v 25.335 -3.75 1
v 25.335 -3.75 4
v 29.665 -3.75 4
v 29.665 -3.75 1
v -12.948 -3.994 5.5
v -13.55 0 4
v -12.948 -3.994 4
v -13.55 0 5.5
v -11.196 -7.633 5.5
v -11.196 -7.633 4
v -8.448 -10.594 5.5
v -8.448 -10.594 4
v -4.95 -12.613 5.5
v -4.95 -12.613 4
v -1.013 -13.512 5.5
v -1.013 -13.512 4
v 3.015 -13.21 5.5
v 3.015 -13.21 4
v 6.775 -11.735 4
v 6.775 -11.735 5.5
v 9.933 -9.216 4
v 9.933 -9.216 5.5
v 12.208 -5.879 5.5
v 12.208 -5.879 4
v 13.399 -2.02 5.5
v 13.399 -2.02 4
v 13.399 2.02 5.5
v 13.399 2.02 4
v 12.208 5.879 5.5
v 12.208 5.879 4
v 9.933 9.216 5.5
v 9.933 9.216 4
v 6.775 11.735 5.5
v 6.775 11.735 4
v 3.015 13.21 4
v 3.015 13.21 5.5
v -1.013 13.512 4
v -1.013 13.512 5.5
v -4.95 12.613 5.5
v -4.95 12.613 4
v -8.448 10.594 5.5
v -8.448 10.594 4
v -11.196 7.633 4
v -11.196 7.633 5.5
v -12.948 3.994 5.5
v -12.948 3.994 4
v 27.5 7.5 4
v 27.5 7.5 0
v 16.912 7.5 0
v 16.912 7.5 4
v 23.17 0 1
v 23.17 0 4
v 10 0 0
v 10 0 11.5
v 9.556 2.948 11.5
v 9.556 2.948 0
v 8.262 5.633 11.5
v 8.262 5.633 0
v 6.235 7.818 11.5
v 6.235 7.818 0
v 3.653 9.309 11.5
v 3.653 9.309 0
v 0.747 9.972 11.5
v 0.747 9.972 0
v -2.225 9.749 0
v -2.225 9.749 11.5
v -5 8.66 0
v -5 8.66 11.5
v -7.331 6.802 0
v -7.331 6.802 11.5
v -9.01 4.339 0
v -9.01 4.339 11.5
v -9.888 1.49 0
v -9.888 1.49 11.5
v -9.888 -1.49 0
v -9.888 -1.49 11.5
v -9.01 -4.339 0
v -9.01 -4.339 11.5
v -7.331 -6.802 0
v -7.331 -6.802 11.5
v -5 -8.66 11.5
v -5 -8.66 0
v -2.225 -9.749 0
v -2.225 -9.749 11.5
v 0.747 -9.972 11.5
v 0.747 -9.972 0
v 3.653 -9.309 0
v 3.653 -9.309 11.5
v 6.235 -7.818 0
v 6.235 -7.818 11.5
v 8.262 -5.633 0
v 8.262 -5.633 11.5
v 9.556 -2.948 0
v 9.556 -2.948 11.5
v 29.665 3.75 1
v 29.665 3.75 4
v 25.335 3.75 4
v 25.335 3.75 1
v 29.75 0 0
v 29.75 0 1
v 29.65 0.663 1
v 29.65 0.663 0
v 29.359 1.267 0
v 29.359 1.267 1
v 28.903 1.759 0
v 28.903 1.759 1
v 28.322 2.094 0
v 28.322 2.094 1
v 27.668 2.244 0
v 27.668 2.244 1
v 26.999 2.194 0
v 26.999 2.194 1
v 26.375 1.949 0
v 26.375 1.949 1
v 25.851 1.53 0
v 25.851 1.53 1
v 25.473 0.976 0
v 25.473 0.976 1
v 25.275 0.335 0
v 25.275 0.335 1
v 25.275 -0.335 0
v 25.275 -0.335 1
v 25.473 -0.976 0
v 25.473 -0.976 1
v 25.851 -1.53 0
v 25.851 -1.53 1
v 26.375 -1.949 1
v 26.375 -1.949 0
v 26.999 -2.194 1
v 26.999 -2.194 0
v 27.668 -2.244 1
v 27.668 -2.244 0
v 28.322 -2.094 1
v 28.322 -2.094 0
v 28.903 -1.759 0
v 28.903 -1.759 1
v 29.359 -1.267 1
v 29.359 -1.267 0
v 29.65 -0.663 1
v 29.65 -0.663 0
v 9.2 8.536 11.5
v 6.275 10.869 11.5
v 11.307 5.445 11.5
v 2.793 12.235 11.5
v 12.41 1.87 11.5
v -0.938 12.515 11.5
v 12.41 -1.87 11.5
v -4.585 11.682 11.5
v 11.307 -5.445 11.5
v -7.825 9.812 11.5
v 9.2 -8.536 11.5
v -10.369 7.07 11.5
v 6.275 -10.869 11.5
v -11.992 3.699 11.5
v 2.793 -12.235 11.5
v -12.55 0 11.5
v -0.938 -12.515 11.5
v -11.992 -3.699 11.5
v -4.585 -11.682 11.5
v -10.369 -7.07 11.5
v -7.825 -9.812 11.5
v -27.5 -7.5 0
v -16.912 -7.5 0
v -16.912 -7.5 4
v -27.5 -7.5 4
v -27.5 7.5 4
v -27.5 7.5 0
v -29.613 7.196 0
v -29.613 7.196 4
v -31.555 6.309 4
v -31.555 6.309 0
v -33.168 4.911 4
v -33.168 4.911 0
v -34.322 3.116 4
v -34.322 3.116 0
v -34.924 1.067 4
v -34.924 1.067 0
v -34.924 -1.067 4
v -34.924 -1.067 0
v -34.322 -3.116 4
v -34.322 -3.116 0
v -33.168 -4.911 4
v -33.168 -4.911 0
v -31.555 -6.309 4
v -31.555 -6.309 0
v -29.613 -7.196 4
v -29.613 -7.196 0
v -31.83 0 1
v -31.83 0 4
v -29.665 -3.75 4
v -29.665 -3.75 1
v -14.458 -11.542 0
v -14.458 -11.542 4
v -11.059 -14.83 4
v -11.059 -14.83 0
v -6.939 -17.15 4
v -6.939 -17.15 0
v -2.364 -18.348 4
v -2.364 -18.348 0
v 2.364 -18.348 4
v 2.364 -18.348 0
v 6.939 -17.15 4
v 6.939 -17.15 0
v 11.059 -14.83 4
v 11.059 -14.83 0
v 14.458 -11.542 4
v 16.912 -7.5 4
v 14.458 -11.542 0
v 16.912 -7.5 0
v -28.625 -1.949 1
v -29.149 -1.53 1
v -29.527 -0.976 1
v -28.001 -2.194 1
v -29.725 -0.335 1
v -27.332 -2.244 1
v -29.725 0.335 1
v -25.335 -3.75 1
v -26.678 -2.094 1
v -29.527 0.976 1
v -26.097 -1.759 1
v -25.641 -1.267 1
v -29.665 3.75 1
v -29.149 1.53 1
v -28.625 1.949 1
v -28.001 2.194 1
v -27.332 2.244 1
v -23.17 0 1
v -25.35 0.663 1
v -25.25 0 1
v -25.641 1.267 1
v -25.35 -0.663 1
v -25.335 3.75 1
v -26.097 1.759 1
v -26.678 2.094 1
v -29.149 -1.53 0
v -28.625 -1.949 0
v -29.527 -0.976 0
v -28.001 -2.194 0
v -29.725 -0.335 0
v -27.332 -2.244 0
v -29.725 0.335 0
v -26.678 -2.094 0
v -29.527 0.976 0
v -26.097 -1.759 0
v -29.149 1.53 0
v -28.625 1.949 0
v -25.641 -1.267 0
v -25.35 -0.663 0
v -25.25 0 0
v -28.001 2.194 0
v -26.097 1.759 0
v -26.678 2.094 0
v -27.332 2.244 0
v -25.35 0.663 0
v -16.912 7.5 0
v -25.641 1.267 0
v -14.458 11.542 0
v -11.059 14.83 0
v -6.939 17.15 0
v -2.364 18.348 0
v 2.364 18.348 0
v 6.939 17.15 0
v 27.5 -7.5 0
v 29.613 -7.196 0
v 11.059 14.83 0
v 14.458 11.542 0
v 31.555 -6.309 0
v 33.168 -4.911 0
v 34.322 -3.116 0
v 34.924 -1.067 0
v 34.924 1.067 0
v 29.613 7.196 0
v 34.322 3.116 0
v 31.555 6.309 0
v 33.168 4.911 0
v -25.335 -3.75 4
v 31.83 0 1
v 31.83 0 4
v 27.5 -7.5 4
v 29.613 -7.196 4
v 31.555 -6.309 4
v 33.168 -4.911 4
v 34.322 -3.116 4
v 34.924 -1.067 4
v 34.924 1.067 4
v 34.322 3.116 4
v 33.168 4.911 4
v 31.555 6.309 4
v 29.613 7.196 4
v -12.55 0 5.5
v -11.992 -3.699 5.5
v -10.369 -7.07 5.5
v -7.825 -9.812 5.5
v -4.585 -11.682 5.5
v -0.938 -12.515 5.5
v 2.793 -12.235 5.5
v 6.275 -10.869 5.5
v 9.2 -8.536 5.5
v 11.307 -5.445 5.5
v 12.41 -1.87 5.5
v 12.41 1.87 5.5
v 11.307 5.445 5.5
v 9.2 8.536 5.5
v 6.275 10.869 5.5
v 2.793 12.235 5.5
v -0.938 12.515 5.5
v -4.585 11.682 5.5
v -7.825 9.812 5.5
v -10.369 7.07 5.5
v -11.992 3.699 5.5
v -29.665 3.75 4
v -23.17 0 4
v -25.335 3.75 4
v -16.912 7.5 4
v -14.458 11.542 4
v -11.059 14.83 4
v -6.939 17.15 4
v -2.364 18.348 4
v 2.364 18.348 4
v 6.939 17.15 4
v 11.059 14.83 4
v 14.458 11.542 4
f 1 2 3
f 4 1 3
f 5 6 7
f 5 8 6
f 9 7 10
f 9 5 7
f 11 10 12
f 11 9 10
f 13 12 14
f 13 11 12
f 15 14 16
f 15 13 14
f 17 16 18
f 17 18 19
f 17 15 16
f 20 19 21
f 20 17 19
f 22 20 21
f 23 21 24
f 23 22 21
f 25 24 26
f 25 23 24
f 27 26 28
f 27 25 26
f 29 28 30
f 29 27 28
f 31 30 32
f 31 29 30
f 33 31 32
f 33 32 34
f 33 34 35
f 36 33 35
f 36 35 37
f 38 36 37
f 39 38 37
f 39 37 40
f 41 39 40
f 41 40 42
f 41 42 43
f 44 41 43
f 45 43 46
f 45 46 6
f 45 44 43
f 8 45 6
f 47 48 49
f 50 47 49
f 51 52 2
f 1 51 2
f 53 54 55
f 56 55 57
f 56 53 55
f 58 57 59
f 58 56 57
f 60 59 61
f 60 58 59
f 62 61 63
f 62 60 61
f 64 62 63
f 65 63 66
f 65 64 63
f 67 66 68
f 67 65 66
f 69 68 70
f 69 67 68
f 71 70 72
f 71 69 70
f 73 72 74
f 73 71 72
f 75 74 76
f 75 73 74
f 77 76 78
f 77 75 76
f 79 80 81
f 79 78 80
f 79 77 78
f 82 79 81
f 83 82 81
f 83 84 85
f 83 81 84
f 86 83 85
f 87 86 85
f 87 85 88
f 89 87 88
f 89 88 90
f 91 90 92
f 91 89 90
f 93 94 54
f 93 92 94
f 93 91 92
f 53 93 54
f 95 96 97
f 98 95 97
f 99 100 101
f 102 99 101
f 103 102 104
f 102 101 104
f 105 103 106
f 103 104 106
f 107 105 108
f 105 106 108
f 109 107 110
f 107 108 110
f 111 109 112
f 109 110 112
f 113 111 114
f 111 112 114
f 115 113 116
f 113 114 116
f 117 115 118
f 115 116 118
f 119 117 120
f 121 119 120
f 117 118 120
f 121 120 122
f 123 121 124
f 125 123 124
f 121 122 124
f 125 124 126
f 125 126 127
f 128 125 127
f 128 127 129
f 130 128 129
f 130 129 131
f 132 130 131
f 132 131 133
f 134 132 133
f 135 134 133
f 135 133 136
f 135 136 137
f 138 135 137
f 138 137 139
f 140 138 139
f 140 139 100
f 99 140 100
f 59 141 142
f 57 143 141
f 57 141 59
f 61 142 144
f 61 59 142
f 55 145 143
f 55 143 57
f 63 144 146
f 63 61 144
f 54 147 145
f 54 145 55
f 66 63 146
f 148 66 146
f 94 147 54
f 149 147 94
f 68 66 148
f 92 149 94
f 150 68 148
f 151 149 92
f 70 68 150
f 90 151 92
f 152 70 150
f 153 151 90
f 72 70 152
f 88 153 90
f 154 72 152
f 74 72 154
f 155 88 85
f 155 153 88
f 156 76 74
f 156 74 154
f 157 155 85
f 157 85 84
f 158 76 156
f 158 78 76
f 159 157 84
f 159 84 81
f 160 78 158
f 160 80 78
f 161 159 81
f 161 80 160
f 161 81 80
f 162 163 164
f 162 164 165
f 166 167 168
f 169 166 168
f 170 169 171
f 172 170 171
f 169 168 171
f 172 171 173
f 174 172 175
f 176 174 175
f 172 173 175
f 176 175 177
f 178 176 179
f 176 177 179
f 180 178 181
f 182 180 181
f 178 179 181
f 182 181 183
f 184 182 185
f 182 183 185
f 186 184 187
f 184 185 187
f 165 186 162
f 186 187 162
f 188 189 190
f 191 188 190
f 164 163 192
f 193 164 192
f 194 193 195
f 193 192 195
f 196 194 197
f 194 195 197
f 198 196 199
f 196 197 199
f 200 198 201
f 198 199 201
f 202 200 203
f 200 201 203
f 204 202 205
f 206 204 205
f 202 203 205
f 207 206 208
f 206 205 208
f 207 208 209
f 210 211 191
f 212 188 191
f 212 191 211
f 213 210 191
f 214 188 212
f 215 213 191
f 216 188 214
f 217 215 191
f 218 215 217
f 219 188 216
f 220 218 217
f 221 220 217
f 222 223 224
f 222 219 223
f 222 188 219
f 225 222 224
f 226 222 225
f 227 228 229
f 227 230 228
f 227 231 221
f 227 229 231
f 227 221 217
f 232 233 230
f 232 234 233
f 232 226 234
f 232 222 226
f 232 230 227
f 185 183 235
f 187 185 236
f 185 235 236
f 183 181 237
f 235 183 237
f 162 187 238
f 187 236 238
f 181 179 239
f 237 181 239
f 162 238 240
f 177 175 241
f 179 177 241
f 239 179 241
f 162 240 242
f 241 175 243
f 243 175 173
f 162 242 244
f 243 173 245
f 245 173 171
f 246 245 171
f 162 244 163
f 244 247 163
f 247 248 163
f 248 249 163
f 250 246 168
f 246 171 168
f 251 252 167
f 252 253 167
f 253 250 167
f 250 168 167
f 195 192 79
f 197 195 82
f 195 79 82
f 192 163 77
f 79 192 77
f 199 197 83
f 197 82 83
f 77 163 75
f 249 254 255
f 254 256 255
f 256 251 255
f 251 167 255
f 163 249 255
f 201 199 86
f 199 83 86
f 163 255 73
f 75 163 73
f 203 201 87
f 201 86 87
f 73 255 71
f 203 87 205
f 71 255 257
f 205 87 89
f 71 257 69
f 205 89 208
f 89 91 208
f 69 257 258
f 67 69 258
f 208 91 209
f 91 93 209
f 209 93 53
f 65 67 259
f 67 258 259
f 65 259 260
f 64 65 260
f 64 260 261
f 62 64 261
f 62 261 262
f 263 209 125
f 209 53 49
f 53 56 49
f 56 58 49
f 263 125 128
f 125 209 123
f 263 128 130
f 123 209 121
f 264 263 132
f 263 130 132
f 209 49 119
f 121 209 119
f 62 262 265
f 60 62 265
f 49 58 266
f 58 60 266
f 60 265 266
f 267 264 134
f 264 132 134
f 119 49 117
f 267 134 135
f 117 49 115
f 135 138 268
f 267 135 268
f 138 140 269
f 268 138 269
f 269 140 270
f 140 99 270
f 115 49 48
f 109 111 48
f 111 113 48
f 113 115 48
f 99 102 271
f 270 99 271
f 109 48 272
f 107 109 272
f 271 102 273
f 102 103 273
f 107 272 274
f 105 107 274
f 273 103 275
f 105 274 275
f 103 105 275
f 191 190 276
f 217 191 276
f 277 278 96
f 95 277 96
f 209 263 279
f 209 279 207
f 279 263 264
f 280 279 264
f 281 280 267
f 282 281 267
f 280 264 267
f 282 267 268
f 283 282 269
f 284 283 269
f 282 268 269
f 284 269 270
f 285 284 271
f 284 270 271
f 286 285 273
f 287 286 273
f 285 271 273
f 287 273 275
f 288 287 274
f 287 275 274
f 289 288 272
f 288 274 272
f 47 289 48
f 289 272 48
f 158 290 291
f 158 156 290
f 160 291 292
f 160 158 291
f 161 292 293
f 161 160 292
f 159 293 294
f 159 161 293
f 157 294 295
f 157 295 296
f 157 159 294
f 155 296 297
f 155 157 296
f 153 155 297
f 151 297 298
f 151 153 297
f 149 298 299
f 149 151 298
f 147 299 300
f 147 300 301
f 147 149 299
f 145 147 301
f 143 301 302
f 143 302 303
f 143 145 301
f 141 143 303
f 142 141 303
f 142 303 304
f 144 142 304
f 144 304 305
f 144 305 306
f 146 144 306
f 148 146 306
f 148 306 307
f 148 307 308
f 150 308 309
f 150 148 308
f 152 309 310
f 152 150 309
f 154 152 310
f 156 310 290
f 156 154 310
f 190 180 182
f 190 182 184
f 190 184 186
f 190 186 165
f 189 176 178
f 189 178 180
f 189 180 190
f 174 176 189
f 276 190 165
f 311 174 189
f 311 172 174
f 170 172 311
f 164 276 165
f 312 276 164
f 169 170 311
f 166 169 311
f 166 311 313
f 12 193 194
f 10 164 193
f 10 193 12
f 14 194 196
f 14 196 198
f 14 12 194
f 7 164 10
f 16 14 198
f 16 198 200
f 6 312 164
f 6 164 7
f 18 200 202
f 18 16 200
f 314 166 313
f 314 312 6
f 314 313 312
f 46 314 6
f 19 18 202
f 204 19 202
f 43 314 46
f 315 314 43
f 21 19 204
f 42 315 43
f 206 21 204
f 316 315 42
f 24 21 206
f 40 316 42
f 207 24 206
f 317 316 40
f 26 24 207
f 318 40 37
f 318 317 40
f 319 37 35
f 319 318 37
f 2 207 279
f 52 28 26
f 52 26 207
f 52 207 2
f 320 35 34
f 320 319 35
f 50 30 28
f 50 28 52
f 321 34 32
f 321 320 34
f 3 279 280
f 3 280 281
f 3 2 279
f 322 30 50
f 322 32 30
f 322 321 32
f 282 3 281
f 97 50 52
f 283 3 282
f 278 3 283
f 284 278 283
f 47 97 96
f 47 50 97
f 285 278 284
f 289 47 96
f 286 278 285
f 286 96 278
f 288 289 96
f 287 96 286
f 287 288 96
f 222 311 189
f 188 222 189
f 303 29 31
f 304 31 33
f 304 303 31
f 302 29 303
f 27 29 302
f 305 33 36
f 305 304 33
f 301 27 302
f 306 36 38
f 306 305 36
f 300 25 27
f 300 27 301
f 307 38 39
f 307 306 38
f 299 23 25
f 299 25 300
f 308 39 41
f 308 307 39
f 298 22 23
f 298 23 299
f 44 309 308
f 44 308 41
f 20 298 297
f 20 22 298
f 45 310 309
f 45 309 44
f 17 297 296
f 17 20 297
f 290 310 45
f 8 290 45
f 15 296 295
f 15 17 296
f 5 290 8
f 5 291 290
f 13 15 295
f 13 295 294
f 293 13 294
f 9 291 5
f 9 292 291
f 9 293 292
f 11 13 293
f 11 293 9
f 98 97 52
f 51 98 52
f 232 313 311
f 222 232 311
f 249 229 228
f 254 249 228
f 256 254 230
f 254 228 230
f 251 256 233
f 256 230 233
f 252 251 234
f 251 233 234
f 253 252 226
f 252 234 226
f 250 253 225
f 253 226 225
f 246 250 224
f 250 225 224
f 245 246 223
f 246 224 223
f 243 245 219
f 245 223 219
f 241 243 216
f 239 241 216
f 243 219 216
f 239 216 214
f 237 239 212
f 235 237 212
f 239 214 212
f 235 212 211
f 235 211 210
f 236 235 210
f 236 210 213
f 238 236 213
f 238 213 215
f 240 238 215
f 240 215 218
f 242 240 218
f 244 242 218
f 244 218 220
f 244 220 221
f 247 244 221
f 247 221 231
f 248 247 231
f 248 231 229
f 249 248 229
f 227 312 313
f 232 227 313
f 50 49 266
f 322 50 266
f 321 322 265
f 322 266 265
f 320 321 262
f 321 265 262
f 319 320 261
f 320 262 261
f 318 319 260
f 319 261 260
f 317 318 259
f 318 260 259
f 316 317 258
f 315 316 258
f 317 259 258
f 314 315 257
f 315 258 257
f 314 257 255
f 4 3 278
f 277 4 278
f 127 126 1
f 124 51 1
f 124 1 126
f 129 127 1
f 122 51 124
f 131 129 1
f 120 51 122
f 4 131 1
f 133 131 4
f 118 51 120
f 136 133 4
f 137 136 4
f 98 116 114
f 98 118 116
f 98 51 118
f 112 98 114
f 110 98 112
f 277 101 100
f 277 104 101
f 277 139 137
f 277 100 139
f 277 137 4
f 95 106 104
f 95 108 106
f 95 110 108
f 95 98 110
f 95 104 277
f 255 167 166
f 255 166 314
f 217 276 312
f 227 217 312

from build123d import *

# Parameters (mm, degrees)
PAD_DEPTH       = 4
SKETCH001_R     = 2.25
HOLE_DEPTH      = 4.001
POCKET001_DEPTH = 3
SKETCH002_R     = 10
POCKET_DEPTH    = 11.501


with BuildPart() as part:
    # Sketch → Pad (new body)
    with BuildSketch(Plane.XY):
        with BuildLine():
            ThreePointArc((-27.5, 7.5), (-35, 0), (-27.5, -7.5))
            Line((-16.911535, -7.5), (-27.5, -7.5))
            ThreePointArc((-16.911535, -7.5), (0, -18.5), (16.911535, -7.5))
            Line((27.5, -7.5), (16.911535, -7.5))
            ThreePointArc((27.5, -7.5), (35, 0), (27.5, 7.5))
            Line((27.5, 7.5), (16.911535, 7.5))
            ThreePointArc((16.911535, 7.5), (0, 18.5), (-16.911535, 7.5))
            Line((-27.5, 7.5), (-16.911535, 7.5))
        make_face()
    extrude(amount=PAD_DEPTH)

    # Sketch001 (on DatumPlane) → Hole (cut, through all)
    with BuildSketch(Plane.XY.offset(4)):
        with Locations((-27.5, 0)):
            Circle(SKETCH001_R)
        with Locations((27.5, 0)):
            Circle(SKETCH001_R)
    extrude(amount=-HOLE_DEPTH, mode=Mode.SUBTRACT)

    # Sketch003 → Revolution (revolve)
    with BuildSketch(Plane.XZ):
        Polygon((0, 4), (-13.55, 4), (-13.55, 5.5), (-12.55, 5.5), (-12.55, 11.5), (0, 11.5), align=None)
    revolve(axis=Axis((0, 0, 0), (0, 0, 1)))

    # Sketch004 (on DatumPlane) → Pocket001 (cut)
    with BuildSketch(Plane.XY.offset(4)):
        Polygon((-23.169873, 0), (-25.334936, 3.75), (-29.665064, 3.75), (-31.830127, 0), (-29.665064, -3.75), (-25.334936, -3.75), align=None)
        Polygon((31.830127, 0), (29.665064, 3.75), (25.334936, 3.75), (23.169873, 0), (25.334936, -3.75), (29.665064, -3.75), align=None)
    extrude(amount=-POCKET001_DEPTH, mode=Mode.SUBTRACT)

    # Sketch002 → Pocket (cut, through all)
    with BuildSketch(Plane.XY):
        Circle(SKETCH002_R)
    extrude(amount=POCKET_DEPTH, mode=Mode.SUBTRACT)


solid = part.part
